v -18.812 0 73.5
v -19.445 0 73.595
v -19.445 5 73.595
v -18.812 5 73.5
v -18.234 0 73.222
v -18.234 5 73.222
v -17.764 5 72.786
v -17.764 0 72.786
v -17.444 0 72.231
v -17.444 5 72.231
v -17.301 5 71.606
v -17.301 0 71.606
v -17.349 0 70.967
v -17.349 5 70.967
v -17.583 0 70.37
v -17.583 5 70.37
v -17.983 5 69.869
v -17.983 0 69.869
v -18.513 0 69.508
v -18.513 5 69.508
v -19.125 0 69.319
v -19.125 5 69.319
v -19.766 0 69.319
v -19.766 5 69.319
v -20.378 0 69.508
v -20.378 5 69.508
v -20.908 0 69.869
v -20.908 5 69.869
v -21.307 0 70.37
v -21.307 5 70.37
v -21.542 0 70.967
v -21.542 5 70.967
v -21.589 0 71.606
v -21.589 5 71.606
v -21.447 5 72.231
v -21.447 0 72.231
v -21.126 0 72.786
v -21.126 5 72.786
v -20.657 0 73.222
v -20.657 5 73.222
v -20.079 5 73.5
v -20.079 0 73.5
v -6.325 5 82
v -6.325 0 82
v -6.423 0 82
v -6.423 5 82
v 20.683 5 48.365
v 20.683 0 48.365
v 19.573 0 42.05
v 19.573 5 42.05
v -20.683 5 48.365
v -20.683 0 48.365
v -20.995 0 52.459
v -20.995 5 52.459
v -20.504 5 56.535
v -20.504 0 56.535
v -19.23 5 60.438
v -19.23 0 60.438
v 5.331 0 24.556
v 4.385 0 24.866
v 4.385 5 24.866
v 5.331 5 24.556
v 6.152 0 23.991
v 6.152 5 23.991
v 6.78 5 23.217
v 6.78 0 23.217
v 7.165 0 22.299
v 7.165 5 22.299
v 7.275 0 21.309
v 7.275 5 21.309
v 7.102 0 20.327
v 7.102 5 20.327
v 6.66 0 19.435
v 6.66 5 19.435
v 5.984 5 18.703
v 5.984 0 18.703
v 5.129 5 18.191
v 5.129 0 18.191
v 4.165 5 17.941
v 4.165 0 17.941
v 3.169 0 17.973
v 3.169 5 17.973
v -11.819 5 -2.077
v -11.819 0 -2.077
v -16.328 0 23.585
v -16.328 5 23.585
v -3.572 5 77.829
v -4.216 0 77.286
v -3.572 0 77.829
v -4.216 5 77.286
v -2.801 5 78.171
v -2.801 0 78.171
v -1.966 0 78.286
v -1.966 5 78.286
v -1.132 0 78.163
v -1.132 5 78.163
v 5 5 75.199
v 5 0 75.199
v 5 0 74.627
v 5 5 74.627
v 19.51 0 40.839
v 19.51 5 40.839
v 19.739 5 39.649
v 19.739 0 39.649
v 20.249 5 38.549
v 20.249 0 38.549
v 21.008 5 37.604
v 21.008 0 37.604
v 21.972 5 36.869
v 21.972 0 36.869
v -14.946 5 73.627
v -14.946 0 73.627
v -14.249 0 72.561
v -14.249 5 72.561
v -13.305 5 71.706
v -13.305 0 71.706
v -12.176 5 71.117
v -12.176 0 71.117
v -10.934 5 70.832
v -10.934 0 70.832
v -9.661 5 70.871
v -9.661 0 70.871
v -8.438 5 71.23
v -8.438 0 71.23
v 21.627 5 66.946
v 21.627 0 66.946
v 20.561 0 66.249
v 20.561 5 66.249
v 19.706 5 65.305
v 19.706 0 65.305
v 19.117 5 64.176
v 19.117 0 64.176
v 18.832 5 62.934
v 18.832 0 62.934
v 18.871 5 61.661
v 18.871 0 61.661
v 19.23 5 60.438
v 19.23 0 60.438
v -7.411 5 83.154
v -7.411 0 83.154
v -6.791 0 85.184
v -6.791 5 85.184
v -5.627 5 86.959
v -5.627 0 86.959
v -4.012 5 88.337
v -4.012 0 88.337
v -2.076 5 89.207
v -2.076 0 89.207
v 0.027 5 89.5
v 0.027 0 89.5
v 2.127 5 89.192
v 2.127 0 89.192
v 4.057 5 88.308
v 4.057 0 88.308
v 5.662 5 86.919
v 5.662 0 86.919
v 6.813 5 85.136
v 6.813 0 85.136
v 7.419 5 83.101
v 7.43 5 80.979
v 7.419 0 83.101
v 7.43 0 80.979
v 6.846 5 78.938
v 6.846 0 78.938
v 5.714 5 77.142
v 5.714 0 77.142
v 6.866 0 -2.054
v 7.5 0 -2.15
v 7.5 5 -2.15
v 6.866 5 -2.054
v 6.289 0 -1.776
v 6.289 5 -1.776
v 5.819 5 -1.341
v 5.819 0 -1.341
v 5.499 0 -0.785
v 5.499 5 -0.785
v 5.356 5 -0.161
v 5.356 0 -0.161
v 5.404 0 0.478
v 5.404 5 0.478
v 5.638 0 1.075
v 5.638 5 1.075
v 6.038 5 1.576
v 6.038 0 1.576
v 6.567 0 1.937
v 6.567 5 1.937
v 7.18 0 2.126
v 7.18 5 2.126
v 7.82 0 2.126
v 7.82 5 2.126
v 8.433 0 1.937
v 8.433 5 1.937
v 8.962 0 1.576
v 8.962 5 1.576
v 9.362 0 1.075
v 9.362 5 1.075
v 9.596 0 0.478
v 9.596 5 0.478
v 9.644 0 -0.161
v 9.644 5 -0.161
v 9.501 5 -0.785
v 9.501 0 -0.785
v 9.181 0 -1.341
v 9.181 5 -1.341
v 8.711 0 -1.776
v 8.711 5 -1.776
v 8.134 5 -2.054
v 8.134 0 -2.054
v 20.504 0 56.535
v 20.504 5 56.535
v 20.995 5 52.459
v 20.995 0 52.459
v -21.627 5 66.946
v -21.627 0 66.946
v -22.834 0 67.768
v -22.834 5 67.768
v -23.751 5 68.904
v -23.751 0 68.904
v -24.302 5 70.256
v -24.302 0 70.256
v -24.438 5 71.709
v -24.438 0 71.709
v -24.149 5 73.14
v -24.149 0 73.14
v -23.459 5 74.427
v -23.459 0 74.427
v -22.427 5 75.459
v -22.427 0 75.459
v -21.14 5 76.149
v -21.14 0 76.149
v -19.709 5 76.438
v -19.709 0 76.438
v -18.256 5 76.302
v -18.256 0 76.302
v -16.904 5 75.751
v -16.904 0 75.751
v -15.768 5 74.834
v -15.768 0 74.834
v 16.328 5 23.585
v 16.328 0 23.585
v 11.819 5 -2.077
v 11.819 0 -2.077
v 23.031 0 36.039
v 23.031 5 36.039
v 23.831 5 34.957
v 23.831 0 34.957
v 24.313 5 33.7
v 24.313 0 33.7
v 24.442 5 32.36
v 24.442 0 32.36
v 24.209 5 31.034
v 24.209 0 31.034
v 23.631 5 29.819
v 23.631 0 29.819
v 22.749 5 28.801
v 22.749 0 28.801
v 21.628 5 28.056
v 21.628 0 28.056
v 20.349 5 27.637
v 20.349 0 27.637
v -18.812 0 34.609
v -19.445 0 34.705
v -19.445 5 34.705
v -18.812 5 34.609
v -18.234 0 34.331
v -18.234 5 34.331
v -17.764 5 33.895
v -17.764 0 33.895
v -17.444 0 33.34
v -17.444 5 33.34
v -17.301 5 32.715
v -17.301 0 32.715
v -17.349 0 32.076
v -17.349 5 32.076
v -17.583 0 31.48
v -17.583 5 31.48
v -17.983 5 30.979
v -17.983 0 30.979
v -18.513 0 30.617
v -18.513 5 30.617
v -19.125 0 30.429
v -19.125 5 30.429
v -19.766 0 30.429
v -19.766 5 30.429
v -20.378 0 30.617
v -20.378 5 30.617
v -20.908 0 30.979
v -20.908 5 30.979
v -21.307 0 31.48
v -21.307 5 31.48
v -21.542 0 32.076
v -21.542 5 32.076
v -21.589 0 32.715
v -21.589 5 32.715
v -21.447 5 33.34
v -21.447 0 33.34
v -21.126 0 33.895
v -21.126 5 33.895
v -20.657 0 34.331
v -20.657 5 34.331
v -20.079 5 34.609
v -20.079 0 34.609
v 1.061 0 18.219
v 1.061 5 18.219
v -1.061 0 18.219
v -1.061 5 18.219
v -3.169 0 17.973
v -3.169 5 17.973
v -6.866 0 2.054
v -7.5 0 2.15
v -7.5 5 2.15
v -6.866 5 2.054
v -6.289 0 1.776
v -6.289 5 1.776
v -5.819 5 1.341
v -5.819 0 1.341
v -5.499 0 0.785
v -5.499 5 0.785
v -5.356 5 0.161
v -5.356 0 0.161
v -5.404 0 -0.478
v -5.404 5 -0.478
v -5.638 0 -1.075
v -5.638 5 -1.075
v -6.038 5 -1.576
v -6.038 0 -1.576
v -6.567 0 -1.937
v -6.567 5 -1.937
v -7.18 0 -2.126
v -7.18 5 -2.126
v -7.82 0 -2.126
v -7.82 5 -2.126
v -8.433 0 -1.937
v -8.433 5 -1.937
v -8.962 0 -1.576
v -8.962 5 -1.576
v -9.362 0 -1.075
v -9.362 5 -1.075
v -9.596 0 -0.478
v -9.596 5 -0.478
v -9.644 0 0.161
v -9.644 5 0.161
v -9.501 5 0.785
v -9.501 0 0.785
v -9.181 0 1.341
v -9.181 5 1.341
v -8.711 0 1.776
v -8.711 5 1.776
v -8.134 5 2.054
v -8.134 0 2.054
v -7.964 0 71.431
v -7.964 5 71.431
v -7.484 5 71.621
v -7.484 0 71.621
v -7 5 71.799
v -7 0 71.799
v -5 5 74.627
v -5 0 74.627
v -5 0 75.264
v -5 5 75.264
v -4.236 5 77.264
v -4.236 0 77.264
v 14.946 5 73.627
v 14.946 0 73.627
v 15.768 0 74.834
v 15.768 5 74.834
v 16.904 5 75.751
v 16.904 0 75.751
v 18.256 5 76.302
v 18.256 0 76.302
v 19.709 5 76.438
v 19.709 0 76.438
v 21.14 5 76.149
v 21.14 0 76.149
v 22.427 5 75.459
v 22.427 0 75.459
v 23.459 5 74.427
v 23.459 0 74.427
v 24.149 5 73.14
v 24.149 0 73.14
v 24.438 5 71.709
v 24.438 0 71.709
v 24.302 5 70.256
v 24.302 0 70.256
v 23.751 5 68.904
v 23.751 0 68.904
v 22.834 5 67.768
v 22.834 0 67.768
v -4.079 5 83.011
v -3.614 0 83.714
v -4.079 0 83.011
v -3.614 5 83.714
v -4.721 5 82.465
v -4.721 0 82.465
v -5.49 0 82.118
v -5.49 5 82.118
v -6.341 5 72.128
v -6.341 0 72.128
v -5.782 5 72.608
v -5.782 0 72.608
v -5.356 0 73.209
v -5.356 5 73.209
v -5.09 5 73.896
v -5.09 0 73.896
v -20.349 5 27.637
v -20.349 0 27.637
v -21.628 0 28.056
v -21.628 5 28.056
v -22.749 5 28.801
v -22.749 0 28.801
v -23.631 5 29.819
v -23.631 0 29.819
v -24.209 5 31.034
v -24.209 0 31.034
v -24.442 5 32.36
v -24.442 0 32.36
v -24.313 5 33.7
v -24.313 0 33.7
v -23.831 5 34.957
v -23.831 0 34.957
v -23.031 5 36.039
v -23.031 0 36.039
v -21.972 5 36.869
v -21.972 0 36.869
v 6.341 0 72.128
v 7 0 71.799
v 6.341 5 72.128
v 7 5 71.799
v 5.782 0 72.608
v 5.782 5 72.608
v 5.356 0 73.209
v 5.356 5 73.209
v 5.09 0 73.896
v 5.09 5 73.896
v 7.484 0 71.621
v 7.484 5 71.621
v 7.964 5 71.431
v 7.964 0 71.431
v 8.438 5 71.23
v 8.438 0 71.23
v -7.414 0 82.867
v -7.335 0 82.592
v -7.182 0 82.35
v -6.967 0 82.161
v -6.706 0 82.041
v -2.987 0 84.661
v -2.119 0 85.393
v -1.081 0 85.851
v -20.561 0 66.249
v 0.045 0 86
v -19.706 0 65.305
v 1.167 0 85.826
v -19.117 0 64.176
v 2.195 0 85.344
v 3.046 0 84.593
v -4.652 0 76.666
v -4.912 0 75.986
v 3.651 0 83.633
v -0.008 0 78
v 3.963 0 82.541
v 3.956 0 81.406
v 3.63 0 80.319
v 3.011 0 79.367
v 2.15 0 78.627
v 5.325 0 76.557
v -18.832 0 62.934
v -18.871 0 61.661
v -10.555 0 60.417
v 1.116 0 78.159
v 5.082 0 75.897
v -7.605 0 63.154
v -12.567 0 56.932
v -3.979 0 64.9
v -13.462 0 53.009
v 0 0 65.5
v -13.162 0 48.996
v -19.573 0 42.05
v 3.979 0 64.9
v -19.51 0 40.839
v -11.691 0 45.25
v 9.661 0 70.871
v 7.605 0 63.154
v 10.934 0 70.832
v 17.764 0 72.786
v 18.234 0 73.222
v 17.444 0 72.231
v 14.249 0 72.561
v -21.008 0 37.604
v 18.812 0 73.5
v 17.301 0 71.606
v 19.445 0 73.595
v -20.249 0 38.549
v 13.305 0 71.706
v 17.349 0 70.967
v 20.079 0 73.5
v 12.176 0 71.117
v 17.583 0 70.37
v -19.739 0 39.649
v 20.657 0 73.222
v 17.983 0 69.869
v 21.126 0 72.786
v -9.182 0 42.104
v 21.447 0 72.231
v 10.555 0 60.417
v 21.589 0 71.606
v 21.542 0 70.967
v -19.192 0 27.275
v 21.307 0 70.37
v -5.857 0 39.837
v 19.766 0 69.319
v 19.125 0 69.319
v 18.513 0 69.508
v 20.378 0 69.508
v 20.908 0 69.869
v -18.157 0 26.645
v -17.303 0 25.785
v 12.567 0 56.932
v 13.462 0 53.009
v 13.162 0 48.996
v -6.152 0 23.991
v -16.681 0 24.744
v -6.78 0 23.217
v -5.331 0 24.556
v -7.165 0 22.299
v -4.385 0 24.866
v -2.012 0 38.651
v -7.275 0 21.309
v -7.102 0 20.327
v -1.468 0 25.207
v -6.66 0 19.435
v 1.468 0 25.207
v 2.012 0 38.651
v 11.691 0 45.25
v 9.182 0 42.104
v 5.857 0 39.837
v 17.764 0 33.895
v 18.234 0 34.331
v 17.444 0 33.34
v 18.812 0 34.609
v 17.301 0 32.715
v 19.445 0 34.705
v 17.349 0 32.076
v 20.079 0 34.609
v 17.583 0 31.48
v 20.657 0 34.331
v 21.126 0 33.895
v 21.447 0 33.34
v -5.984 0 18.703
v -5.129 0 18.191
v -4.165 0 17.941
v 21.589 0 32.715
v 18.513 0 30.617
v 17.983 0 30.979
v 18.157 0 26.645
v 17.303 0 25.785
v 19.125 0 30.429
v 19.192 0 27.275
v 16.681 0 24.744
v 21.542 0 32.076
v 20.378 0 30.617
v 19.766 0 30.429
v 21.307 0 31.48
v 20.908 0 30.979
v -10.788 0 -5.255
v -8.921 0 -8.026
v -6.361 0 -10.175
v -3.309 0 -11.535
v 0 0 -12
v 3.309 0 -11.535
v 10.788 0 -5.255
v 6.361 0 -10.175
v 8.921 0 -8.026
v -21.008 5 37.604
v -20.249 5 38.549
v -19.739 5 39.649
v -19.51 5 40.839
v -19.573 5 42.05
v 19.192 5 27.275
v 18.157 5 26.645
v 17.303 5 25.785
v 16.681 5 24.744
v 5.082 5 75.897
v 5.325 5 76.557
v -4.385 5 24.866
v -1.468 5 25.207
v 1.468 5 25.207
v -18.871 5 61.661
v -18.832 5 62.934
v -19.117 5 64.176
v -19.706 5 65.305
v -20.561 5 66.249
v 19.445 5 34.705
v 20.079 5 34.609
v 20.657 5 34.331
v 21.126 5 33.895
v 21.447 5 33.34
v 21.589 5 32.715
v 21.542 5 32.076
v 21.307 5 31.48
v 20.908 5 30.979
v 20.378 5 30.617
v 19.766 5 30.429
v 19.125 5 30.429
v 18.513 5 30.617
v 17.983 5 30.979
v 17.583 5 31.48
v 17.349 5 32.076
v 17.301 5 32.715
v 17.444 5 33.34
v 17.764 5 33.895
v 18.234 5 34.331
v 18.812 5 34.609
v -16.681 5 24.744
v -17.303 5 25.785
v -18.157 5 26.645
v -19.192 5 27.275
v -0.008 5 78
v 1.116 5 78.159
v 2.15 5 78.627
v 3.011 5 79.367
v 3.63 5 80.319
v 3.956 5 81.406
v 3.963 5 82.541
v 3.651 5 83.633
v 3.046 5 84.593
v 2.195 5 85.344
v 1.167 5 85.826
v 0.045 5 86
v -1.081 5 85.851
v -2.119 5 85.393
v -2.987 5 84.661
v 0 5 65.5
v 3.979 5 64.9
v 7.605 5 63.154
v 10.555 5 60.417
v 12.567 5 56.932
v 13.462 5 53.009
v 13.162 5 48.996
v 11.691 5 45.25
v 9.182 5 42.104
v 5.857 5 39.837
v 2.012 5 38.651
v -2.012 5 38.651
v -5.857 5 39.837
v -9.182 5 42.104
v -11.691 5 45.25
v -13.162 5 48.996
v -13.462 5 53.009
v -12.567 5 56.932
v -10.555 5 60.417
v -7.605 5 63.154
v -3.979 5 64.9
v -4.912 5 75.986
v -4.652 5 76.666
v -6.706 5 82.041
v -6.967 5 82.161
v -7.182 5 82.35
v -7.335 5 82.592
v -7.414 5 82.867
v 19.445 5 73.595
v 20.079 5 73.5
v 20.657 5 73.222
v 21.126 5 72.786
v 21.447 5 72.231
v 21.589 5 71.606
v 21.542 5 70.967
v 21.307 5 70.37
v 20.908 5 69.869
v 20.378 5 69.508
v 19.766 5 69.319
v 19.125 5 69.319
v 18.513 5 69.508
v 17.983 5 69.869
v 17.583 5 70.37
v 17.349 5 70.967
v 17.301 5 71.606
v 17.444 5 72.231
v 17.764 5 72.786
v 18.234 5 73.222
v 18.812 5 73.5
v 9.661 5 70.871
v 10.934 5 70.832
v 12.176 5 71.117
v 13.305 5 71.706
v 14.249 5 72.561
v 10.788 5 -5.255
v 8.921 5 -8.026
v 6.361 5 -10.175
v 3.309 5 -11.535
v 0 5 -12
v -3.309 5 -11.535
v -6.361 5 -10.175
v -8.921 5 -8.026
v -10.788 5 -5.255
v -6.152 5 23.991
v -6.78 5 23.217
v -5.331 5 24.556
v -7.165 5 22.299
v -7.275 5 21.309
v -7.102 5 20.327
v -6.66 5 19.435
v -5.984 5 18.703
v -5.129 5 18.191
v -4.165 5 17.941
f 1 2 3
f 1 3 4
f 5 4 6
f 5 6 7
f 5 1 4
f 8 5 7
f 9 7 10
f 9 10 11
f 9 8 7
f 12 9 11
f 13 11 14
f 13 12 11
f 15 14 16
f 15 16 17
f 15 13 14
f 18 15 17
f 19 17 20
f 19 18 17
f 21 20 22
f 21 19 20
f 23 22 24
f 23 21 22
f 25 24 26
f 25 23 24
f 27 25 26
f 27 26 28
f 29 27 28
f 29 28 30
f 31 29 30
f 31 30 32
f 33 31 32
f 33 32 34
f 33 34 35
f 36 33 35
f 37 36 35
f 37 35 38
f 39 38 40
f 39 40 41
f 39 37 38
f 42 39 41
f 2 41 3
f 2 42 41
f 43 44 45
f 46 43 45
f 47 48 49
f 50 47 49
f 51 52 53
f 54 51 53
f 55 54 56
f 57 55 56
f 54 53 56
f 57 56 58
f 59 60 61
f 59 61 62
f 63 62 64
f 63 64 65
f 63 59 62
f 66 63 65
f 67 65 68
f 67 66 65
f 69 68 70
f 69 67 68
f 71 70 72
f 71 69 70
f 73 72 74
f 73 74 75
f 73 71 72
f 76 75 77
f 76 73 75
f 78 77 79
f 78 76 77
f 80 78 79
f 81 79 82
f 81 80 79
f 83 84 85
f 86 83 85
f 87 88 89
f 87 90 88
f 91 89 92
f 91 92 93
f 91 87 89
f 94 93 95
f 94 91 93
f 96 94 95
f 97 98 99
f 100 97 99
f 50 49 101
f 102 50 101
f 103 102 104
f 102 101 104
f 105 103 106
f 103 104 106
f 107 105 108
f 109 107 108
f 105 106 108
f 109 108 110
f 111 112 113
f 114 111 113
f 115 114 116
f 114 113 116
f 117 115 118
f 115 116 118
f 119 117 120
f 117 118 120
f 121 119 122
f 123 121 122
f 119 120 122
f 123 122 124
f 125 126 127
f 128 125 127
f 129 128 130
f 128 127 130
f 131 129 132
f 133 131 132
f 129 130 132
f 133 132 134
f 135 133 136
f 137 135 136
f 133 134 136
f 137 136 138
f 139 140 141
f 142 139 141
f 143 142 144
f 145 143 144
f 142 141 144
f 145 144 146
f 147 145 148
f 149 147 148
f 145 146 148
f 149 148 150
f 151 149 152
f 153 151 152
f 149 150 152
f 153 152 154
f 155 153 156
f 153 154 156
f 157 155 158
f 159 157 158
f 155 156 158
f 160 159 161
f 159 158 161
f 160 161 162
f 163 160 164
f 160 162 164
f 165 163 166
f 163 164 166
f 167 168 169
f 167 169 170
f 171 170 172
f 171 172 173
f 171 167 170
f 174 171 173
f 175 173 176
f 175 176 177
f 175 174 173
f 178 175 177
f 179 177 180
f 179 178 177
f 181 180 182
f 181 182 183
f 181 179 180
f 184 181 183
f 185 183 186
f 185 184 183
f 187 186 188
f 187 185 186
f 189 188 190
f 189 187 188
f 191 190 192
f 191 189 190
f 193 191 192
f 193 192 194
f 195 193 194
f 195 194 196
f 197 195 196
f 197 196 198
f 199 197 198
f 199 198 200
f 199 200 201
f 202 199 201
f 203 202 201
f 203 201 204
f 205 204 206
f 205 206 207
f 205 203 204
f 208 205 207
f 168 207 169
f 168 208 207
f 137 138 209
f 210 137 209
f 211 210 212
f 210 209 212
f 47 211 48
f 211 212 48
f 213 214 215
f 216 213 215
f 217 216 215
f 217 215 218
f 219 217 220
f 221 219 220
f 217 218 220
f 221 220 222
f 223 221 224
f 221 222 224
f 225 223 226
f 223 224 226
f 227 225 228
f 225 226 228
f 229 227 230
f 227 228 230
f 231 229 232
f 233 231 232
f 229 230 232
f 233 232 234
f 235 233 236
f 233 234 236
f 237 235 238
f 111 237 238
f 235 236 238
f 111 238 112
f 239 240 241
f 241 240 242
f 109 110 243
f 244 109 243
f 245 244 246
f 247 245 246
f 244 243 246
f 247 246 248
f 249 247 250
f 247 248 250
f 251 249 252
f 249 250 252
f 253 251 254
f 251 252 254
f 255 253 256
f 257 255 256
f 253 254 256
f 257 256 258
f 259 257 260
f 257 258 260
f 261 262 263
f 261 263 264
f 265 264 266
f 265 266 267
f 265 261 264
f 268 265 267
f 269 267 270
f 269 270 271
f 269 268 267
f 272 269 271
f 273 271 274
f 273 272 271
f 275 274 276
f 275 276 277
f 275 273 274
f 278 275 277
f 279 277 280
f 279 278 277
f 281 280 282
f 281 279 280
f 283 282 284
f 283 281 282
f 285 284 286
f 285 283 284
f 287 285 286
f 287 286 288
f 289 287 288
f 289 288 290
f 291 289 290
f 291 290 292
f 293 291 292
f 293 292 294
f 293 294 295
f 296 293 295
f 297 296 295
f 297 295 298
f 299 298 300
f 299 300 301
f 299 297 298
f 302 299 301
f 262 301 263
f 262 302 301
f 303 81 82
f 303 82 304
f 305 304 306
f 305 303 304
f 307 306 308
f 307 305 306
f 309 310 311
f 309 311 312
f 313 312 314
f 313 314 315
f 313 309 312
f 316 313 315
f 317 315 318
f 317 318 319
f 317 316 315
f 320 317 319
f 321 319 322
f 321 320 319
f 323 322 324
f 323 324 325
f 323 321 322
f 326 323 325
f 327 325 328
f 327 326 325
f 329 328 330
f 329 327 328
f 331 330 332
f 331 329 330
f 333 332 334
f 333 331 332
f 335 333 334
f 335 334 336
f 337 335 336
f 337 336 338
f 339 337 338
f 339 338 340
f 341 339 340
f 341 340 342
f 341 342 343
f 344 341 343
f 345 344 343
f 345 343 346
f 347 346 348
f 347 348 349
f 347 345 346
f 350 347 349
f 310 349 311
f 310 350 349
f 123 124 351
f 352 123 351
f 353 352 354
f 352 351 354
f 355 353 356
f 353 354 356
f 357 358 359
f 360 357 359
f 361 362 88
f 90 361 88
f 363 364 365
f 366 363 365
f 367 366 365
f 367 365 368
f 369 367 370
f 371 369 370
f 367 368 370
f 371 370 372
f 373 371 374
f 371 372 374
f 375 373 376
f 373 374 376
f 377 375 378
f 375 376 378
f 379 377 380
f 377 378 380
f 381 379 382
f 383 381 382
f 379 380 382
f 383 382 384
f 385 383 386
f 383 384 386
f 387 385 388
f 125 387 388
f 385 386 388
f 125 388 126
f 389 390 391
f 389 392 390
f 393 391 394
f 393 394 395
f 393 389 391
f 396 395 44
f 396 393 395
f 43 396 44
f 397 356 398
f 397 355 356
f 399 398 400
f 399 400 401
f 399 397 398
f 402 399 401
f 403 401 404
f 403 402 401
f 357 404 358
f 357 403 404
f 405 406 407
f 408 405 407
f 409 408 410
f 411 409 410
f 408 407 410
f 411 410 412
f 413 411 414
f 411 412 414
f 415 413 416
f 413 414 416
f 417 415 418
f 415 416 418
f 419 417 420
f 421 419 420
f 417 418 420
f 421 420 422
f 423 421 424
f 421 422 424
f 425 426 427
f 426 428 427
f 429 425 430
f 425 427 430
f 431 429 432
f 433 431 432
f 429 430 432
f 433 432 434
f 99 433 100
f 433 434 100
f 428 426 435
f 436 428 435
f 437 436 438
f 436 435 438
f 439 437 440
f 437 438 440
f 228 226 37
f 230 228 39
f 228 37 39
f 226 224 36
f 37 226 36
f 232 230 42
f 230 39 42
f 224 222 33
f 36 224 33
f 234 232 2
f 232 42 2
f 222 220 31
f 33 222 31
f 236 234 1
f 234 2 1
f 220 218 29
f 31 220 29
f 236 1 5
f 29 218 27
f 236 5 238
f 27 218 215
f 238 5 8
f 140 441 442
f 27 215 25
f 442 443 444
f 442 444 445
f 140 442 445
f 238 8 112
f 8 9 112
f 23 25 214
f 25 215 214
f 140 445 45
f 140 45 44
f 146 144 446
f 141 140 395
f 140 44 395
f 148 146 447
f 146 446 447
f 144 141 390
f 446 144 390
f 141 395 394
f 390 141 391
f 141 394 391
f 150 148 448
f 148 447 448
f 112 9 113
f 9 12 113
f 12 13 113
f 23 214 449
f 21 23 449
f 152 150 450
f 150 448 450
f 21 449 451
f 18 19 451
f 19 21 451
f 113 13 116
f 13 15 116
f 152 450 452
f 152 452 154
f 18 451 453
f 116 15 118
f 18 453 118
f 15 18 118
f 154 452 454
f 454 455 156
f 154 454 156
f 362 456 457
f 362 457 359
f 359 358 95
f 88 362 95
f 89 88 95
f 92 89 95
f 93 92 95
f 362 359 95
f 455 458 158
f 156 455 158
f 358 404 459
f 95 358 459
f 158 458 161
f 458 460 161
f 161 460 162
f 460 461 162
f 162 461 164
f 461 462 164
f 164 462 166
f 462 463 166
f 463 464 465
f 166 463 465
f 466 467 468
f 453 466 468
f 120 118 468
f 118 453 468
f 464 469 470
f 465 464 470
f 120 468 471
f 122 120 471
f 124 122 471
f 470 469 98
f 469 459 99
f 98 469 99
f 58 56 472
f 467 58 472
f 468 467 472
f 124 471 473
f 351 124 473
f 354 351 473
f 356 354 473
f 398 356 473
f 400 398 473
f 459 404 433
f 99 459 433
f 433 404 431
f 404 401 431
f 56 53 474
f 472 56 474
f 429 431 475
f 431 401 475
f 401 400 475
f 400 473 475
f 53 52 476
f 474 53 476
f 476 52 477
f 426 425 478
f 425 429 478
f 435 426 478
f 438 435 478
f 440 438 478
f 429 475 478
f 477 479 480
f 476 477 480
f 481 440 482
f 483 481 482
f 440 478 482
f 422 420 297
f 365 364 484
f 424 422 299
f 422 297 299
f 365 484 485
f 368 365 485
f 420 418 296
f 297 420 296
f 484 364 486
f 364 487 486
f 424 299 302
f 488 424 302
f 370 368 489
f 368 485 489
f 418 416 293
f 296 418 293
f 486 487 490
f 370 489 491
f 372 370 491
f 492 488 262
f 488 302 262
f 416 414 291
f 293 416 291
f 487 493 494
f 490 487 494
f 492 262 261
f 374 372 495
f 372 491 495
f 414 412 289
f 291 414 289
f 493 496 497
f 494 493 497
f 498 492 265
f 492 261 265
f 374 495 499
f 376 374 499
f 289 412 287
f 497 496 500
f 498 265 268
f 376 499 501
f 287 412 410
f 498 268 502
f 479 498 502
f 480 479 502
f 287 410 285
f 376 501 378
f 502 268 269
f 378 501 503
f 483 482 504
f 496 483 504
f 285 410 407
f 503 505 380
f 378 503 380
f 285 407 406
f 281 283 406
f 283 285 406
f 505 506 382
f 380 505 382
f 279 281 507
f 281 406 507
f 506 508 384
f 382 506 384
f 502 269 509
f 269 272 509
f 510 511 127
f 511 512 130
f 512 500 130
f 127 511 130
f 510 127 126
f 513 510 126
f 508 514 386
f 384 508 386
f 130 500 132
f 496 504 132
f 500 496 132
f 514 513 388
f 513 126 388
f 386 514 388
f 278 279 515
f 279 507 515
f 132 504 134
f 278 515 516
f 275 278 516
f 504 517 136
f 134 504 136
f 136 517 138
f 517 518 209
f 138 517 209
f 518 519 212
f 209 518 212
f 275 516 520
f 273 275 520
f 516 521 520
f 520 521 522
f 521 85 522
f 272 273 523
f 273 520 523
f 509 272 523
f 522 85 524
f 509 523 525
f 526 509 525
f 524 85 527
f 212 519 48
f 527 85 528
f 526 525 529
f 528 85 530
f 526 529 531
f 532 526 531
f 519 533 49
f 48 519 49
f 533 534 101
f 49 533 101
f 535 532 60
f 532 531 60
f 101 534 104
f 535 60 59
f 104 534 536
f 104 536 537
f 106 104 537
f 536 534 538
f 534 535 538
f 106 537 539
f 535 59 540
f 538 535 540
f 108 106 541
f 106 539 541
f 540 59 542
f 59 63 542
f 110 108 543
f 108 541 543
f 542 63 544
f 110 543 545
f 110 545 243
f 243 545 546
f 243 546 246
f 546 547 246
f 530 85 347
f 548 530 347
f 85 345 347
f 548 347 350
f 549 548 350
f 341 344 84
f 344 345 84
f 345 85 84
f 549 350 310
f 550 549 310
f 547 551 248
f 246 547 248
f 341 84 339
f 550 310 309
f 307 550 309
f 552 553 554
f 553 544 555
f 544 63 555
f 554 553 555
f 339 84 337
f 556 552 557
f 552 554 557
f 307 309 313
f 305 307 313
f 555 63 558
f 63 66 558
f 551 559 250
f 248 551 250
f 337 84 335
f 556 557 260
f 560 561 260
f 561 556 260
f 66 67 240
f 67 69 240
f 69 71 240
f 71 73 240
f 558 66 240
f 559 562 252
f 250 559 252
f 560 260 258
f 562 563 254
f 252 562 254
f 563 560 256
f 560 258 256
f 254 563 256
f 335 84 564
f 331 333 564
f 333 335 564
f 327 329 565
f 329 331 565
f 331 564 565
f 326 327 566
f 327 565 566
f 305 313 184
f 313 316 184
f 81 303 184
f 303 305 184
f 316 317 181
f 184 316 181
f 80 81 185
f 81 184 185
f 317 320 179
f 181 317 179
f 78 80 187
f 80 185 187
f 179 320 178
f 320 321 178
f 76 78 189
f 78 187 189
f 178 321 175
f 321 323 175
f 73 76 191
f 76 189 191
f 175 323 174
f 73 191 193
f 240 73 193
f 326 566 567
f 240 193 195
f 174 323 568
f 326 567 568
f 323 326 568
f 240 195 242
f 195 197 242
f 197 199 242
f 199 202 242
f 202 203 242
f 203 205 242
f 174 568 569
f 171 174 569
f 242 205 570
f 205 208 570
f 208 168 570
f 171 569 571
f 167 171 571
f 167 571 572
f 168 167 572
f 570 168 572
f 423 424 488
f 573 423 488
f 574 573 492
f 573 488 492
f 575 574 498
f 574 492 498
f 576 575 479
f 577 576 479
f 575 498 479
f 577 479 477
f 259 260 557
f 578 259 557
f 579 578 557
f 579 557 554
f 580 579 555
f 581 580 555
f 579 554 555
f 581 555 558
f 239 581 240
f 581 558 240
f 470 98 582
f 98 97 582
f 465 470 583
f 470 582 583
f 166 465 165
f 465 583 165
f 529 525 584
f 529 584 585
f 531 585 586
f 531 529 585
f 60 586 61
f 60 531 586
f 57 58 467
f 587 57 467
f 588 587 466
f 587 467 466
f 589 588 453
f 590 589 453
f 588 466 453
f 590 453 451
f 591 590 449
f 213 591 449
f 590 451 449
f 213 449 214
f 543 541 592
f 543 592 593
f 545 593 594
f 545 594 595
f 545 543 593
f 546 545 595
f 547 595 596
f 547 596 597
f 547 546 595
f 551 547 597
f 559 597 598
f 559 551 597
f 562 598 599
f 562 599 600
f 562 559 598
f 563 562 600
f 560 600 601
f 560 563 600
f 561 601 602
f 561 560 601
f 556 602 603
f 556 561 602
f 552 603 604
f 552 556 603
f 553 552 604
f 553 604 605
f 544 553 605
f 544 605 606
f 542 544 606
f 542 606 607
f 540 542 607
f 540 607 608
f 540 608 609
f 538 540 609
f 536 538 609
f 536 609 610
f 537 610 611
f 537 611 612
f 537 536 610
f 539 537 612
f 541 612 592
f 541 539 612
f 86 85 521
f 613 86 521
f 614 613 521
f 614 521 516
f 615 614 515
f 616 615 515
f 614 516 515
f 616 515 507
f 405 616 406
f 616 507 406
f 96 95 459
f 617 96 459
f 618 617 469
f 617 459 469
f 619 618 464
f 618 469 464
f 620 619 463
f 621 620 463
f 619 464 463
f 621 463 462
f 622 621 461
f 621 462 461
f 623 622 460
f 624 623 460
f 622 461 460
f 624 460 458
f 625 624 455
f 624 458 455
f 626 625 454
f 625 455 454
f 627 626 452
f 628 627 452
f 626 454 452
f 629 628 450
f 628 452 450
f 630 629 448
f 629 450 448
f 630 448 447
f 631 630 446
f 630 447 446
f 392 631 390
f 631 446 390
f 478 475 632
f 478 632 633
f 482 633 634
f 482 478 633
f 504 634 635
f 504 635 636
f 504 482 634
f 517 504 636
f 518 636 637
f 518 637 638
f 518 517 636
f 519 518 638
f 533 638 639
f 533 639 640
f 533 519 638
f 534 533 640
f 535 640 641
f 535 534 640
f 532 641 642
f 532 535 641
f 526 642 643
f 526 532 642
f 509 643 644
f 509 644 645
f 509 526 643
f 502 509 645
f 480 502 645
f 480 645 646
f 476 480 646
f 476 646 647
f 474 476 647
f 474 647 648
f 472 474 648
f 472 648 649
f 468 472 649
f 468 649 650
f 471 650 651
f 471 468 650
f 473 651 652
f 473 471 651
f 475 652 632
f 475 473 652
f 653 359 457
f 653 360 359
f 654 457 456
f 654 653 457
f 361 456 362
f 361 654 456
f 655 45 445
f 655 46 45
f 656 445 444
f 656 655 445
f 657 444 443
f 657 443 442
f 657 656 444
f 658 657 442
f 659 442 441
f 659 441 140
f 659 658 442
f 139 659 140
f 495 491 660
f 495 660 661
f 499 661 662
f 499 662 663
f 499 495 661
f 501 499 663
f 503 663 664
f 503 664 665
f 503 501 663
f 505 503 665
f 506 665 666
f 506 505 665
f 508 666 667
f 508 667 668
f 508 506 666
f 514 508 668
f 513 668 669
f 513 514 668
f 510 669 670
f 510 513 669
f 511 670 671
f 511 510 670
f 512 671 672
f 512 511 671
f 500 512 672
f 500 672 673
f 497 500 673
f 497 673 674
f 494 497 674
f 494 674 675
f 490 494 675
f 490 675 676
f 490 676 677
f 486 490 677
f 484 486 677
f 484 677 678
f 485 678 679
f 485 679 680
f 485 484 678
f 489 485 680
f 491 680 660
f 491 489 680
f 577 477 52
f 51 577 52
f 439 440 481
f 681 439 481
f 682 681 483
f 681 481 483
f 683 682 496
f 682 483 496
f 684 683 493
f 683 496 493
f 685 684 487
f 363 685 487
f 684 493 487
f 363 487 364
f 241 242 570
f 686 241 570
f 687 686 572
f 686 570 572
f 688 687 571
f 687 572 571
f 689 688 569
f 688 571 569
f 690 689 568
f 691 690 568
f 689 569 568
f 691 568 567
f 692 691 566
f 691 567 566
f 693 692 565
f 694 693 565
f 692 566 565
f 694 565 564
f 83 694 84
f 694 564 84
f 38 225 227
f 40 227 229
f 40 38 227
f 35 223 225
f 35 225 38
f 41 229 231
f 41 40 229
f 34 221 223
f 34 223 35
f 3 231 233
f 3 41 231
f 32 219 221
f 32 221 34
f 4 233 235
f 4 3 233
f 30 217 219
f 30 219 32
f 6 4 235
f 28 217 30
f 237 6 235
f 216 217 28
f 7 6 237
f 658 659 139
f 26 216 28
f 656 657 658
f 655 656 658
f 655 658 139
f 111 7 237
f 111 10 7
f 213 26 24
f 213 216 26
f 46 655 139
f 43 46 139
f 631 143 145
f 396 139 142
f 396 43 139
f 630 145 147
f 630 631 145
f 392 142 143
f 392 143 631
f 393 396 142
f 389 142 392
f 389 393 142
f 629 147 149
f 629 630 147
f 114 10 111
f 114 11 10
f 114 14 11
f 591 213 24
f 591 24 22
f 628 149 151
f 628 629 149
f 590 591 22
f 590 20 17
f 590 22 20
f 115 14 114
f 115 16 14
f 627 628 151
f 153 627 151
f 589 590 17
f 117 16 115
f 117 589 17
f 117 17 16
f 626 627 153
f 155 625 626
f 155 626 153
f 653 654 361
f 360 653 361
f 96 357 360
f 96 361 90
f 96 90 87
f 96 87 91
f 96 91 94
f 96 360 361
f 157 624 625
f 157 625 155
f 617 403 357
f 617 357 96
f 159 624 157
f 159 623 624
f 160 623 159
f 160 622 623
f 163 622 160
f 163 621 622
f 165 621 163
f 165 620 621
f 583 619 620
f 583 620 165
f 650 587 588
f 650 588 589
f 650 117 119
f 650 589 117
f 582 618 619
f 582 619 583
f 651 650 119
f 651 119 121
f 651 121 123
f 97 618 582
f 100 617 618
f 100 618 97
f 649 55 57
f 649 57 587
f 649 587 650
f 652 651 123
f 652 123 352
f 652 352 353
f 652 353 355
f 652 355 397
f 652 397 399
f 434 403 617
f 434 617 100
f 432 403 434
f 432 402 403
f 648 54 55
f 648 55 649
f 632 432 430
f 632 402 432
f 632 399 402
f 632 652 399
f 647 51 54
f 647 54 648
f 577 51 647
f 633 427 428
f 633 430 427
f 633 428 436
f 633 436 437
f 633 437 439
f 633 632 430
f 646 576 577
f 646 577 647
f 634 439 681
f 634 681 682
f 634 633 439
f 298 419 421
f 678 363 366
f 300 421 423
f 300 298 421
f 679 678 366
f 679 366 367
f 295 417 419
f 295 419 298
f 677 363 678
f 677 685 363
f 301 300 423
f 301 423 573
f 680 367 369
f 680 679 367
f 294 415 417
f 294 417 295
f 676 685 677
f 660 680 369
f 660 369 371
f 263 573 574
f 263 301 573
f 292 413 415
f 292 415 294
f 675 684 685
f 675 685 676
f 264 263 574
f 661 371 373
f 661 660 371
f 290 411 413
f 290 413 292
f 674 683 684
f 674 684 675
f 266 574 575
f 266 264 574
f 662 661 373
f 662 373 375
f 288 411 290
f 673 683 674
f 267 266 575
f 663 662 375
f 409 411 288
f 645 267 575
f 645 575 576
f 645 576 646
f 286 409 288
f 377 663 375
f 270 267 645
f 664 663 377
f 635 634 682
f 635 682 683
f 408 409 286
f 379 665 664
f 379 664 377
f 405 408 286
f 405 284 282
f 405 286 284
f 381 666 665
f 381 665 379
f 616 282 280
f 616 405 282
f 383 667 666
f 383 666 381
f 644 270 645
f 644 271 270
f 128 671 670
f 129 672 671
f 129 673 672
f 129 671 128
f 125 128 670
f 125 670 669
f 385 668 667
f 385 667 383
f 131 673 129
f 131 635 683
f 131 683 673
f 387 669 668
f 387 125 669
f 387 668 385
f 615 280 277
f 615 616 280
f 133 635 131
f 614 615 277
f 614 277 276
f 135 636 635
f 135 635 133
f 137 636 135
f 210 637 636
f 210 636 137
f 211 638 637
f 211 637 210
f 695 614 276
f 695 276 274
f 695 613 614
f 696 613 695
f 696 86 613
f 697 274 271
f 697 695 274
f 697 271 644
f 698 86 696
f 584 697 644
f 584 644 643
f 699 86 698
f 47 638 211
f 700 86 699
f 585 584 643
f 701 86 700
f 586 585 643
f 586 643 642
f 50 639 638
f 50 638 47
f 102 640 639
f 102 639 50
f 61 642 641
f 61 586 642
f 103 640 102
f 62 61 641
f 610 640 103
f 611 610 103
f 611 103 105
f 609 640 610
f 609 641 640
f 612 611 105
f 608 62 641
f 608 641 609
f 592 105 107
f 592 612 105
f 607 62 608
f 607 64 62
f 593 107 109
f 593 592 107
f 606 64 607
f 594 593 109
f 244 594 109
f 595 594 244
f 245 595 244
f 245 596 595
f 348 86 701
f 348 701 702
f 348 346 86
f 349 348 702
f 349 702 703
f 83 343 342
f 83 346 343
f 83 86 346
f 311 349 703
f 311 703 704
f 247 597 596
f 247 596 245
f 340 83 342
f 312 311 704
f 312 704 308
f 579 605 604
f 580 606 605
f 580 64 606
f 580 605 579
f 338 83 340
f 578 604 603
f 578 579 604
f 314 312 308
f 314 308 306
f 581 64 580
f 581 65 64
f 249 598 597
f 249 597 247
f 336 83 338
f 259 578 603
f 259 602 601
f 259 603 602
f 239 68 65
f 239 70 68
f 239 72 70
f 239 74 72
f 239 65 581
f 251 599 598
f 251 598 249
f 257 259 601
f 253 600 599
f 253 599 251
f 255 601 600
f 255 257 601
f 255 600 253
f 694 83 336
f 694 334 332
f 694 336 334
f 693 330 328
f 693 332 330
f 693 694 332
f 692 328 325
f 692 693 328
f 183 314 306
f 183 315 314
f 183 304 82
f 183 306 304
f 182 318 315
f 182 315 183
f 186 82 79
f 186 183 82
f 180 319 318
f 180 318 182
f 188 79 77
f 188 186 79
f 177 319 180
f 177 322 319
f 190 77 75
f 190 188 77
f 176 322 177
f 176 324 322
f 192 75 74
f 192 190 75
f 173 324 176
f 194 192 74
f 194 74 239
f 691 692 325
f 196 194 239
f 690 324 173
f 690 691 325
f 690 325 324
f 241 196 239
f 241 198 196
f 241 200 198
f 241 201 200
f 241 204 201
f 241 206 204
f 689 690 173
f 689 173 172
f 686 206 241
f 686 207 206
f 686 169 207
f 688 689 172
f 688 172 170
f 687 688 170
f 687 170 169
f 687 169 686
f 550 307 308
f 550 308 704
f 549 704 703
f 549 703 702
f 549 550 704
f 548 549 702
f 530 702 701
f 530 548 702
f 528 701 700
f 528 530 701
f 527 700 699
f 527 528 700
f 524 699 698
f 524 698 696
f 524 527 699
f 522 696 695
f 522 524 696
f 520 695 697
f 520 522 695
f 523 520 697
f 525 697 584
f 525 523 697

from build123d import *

# Parameters (mm, degrees)
SKETCH_1_R      = 2.15
SKETCH_1_R_2    = 13.5
EXTRUDE_1_DEPTH = 5
FILLET_1_R      = 3
FILLET_2_R      = 1


with BuildPart() as part:
    # ｽｹｯﾁ1 → ﾎﾞｽ - 押し出し1 (new body)
    with BuildSketch(Plane(origin=(0, 0, 0), x_dir=(1, 0, 0), z_dir=(0, 1, 0))):
        with BuildLine():
            Line((-11.818899718, 2.076923077), (-16.328382426, -23.584655104))
            ThreePointArc((-16.328382426, -23.584655104), (-17.703637569, -26.24099819), (-20.349180229, -27.636917003))
            ThreePointArc((-20.349180229, -27.636917003), (-24.369978032, -31.689178902), (-21.971608059, -36.869474544))
            ThreePointArc((-21.971608059, -36.869474544), (-19.960473468, -39.083706455), (-19.573238085, -42.049770186))
            Line((-19.573238085, -42.049770186), (-20.683074506, -48.365384615))
            ThreePointArc((-20.683074506, -48.365384615), (-20.849535948, -54.509352655), (-19.230026487, -60.438369589))
            ThreePointArc((-19.230026487, -60.438369589), (-19.11671849, -64.1755701), (-21.627020352, -66.946470844))
            ThreePointArc((-21.627020352, -66.946470844), (-22.980970389, -74.980970389), (-14.946470844, -73.627020352))
            ThreePointArc((-14.946470844, -73.627020352), (-12.1755701, -71.11671849), (-8.438369589, -71.230026487))
            ThreePointArc((-8.438369589, -71.230026487), (-6.744432027, -71.887499507), (-5, -72.396078054))
            Line((-5, -72.396078054), (-5, -76.409830056))
            Line((-5, -76.409830056), (-2.666666667, -79.01857603))
            ThreePointArc((-2.666666667, -79.01857603), (3.651483717, -83.632993162), (-4, -82))
            Line((-4, -82), (-7.5, -82))
            ThreePointArc((-7.5, -82), (3.061862178, -88.846531969), (5, -76.409830056))
            Line((5, -76.409830056), (5, -72.396078054))
            ThreePointArc((5, -72.396078054), (6.744432027, -71.887499507), (8.438369589, -71.230026487))
            ThreePointArc((8.438369589, -71.230026487), (12.1755701, -71.11671849), (14.946470844, -73.627020352))
            ThreePointArc((14.946470844, -73.627020352), (22.980970389, -74.980970389), (21.627020352, -66.946470844))
            ThreePointArc((21.627020352, -66.946470844), (19.11671849, -64.1755701), (19.230026487, -60.438369589))
            ThreePointArc((19.230026487, -60.438369589), (20.849535948, -54.509352655), (20.683074506, -48.365384615))
            Line((20.683074506, -48.365384615), (19.573238085, -42.049770186))
            ThreePointArc((19.573238085, -42.049770186), (19.960473468, -39.083706455), (21.971608059, -36.869474544))
            ThreePointArc((21.971608059, -36.869474544), (24.369978032, -31.689178902), (20.349180229, -27.636917003))
            ThreePointArc((20.349180229, -27.636917003), (17.703637569, -26.24099819), (16.328382426, -23.584655104))
            Line((16.328382426, -23.584655104), (11.818899718, 2.076923077))
            ThreePointArc((11.818899718, 2.076923077), (0, 12), (-11.818899718, 2.076923077))
        make_face()
        with Locations(Location((-7.5, 0, 0), (0, 0, 270))):
            Circle(SKETCH_1_R, mode=Mode.SUBTRACT)
        with Locations(Location((7.5, 0, 0), (0, 0, 90))):
            Circle(SKETCH_1_R, mode=Mode.SUBTRACT)
        with Locations(Location((0, -52, 0), (0, 0, 270))):
            Circle(SKETCH_1_R_2, mode=Mode.SUBTRACT)
        with Locations(Location((19.445436483, -32.554563517, 0), (0, 0, 270))):
            Circle(SKETCH_1_R, mode=Mode.SUBTRACT)
        with Locations(Location((19.445436483, -71.445436483, 0), (0, 0, 270))):
            Circle(SKETCH_1_R, mode=Mode.SUBTRACT)
        with Locations(Location((-19.445436483, -71.445436483, 0), (0, 0, 270))):
            Circle(SKETCH_1_R, mode=Mode.SUBTRACT)
        with Locations(Location((-19.445436483, -32.554563517, 0), (0, 0, 270))):
            Circle(SKETCH_1_R, mode=Mode.SUBTRACT)
        with BuildLine():
            ThreePointArc((-4.384616486, -24.866395764), (0, -25.25), (4.384616486, -24.866395764))
            ThreePointArc((4.384616486, -24.866395764), (7.223675, -20.811800006), (3.169079242, -17.972741492))
            ThreePointArc((3.169079242, -17.972741492), (0, -18.25), (-3.169079242, -17.972741492))
            ThreePointArc((-3.169079242, -17.972741492), (-7.223675, -20.811800006), (-4.384616486, -24.866395764))
        make_face(mode=Mode.SUBTRACT)
    extrude(amount=EXTRUDE_1_DEPTH)

    # ﾌｨﾚｯﾄ1
    fillet_1_edges = [part.edges().sort_by_distance(p)[0] for p in [
        (5, 2.5, 72.396078054),
        (5, 2.5, 76.409830056),
        (-4, 2.5, 82),
        (-2.666666667, 2.5, 79.01857603),
        (-5, 2.5, 76.409830056),
        (-5, 2.5, 72.396078054),
    ]]
    fillet(fillet_1_edges, radius=FILLET_1_R)

    # ﾌｨﾚｯﾄ2
    fillet_2_edges = [part.edges().sort_by_distance(p)[0] for p in [
        (-7.5, 2.5, 82),
    ]]
    fillet(fillet_2_edges, radius=FILLET_2_R)


solid = part.part
